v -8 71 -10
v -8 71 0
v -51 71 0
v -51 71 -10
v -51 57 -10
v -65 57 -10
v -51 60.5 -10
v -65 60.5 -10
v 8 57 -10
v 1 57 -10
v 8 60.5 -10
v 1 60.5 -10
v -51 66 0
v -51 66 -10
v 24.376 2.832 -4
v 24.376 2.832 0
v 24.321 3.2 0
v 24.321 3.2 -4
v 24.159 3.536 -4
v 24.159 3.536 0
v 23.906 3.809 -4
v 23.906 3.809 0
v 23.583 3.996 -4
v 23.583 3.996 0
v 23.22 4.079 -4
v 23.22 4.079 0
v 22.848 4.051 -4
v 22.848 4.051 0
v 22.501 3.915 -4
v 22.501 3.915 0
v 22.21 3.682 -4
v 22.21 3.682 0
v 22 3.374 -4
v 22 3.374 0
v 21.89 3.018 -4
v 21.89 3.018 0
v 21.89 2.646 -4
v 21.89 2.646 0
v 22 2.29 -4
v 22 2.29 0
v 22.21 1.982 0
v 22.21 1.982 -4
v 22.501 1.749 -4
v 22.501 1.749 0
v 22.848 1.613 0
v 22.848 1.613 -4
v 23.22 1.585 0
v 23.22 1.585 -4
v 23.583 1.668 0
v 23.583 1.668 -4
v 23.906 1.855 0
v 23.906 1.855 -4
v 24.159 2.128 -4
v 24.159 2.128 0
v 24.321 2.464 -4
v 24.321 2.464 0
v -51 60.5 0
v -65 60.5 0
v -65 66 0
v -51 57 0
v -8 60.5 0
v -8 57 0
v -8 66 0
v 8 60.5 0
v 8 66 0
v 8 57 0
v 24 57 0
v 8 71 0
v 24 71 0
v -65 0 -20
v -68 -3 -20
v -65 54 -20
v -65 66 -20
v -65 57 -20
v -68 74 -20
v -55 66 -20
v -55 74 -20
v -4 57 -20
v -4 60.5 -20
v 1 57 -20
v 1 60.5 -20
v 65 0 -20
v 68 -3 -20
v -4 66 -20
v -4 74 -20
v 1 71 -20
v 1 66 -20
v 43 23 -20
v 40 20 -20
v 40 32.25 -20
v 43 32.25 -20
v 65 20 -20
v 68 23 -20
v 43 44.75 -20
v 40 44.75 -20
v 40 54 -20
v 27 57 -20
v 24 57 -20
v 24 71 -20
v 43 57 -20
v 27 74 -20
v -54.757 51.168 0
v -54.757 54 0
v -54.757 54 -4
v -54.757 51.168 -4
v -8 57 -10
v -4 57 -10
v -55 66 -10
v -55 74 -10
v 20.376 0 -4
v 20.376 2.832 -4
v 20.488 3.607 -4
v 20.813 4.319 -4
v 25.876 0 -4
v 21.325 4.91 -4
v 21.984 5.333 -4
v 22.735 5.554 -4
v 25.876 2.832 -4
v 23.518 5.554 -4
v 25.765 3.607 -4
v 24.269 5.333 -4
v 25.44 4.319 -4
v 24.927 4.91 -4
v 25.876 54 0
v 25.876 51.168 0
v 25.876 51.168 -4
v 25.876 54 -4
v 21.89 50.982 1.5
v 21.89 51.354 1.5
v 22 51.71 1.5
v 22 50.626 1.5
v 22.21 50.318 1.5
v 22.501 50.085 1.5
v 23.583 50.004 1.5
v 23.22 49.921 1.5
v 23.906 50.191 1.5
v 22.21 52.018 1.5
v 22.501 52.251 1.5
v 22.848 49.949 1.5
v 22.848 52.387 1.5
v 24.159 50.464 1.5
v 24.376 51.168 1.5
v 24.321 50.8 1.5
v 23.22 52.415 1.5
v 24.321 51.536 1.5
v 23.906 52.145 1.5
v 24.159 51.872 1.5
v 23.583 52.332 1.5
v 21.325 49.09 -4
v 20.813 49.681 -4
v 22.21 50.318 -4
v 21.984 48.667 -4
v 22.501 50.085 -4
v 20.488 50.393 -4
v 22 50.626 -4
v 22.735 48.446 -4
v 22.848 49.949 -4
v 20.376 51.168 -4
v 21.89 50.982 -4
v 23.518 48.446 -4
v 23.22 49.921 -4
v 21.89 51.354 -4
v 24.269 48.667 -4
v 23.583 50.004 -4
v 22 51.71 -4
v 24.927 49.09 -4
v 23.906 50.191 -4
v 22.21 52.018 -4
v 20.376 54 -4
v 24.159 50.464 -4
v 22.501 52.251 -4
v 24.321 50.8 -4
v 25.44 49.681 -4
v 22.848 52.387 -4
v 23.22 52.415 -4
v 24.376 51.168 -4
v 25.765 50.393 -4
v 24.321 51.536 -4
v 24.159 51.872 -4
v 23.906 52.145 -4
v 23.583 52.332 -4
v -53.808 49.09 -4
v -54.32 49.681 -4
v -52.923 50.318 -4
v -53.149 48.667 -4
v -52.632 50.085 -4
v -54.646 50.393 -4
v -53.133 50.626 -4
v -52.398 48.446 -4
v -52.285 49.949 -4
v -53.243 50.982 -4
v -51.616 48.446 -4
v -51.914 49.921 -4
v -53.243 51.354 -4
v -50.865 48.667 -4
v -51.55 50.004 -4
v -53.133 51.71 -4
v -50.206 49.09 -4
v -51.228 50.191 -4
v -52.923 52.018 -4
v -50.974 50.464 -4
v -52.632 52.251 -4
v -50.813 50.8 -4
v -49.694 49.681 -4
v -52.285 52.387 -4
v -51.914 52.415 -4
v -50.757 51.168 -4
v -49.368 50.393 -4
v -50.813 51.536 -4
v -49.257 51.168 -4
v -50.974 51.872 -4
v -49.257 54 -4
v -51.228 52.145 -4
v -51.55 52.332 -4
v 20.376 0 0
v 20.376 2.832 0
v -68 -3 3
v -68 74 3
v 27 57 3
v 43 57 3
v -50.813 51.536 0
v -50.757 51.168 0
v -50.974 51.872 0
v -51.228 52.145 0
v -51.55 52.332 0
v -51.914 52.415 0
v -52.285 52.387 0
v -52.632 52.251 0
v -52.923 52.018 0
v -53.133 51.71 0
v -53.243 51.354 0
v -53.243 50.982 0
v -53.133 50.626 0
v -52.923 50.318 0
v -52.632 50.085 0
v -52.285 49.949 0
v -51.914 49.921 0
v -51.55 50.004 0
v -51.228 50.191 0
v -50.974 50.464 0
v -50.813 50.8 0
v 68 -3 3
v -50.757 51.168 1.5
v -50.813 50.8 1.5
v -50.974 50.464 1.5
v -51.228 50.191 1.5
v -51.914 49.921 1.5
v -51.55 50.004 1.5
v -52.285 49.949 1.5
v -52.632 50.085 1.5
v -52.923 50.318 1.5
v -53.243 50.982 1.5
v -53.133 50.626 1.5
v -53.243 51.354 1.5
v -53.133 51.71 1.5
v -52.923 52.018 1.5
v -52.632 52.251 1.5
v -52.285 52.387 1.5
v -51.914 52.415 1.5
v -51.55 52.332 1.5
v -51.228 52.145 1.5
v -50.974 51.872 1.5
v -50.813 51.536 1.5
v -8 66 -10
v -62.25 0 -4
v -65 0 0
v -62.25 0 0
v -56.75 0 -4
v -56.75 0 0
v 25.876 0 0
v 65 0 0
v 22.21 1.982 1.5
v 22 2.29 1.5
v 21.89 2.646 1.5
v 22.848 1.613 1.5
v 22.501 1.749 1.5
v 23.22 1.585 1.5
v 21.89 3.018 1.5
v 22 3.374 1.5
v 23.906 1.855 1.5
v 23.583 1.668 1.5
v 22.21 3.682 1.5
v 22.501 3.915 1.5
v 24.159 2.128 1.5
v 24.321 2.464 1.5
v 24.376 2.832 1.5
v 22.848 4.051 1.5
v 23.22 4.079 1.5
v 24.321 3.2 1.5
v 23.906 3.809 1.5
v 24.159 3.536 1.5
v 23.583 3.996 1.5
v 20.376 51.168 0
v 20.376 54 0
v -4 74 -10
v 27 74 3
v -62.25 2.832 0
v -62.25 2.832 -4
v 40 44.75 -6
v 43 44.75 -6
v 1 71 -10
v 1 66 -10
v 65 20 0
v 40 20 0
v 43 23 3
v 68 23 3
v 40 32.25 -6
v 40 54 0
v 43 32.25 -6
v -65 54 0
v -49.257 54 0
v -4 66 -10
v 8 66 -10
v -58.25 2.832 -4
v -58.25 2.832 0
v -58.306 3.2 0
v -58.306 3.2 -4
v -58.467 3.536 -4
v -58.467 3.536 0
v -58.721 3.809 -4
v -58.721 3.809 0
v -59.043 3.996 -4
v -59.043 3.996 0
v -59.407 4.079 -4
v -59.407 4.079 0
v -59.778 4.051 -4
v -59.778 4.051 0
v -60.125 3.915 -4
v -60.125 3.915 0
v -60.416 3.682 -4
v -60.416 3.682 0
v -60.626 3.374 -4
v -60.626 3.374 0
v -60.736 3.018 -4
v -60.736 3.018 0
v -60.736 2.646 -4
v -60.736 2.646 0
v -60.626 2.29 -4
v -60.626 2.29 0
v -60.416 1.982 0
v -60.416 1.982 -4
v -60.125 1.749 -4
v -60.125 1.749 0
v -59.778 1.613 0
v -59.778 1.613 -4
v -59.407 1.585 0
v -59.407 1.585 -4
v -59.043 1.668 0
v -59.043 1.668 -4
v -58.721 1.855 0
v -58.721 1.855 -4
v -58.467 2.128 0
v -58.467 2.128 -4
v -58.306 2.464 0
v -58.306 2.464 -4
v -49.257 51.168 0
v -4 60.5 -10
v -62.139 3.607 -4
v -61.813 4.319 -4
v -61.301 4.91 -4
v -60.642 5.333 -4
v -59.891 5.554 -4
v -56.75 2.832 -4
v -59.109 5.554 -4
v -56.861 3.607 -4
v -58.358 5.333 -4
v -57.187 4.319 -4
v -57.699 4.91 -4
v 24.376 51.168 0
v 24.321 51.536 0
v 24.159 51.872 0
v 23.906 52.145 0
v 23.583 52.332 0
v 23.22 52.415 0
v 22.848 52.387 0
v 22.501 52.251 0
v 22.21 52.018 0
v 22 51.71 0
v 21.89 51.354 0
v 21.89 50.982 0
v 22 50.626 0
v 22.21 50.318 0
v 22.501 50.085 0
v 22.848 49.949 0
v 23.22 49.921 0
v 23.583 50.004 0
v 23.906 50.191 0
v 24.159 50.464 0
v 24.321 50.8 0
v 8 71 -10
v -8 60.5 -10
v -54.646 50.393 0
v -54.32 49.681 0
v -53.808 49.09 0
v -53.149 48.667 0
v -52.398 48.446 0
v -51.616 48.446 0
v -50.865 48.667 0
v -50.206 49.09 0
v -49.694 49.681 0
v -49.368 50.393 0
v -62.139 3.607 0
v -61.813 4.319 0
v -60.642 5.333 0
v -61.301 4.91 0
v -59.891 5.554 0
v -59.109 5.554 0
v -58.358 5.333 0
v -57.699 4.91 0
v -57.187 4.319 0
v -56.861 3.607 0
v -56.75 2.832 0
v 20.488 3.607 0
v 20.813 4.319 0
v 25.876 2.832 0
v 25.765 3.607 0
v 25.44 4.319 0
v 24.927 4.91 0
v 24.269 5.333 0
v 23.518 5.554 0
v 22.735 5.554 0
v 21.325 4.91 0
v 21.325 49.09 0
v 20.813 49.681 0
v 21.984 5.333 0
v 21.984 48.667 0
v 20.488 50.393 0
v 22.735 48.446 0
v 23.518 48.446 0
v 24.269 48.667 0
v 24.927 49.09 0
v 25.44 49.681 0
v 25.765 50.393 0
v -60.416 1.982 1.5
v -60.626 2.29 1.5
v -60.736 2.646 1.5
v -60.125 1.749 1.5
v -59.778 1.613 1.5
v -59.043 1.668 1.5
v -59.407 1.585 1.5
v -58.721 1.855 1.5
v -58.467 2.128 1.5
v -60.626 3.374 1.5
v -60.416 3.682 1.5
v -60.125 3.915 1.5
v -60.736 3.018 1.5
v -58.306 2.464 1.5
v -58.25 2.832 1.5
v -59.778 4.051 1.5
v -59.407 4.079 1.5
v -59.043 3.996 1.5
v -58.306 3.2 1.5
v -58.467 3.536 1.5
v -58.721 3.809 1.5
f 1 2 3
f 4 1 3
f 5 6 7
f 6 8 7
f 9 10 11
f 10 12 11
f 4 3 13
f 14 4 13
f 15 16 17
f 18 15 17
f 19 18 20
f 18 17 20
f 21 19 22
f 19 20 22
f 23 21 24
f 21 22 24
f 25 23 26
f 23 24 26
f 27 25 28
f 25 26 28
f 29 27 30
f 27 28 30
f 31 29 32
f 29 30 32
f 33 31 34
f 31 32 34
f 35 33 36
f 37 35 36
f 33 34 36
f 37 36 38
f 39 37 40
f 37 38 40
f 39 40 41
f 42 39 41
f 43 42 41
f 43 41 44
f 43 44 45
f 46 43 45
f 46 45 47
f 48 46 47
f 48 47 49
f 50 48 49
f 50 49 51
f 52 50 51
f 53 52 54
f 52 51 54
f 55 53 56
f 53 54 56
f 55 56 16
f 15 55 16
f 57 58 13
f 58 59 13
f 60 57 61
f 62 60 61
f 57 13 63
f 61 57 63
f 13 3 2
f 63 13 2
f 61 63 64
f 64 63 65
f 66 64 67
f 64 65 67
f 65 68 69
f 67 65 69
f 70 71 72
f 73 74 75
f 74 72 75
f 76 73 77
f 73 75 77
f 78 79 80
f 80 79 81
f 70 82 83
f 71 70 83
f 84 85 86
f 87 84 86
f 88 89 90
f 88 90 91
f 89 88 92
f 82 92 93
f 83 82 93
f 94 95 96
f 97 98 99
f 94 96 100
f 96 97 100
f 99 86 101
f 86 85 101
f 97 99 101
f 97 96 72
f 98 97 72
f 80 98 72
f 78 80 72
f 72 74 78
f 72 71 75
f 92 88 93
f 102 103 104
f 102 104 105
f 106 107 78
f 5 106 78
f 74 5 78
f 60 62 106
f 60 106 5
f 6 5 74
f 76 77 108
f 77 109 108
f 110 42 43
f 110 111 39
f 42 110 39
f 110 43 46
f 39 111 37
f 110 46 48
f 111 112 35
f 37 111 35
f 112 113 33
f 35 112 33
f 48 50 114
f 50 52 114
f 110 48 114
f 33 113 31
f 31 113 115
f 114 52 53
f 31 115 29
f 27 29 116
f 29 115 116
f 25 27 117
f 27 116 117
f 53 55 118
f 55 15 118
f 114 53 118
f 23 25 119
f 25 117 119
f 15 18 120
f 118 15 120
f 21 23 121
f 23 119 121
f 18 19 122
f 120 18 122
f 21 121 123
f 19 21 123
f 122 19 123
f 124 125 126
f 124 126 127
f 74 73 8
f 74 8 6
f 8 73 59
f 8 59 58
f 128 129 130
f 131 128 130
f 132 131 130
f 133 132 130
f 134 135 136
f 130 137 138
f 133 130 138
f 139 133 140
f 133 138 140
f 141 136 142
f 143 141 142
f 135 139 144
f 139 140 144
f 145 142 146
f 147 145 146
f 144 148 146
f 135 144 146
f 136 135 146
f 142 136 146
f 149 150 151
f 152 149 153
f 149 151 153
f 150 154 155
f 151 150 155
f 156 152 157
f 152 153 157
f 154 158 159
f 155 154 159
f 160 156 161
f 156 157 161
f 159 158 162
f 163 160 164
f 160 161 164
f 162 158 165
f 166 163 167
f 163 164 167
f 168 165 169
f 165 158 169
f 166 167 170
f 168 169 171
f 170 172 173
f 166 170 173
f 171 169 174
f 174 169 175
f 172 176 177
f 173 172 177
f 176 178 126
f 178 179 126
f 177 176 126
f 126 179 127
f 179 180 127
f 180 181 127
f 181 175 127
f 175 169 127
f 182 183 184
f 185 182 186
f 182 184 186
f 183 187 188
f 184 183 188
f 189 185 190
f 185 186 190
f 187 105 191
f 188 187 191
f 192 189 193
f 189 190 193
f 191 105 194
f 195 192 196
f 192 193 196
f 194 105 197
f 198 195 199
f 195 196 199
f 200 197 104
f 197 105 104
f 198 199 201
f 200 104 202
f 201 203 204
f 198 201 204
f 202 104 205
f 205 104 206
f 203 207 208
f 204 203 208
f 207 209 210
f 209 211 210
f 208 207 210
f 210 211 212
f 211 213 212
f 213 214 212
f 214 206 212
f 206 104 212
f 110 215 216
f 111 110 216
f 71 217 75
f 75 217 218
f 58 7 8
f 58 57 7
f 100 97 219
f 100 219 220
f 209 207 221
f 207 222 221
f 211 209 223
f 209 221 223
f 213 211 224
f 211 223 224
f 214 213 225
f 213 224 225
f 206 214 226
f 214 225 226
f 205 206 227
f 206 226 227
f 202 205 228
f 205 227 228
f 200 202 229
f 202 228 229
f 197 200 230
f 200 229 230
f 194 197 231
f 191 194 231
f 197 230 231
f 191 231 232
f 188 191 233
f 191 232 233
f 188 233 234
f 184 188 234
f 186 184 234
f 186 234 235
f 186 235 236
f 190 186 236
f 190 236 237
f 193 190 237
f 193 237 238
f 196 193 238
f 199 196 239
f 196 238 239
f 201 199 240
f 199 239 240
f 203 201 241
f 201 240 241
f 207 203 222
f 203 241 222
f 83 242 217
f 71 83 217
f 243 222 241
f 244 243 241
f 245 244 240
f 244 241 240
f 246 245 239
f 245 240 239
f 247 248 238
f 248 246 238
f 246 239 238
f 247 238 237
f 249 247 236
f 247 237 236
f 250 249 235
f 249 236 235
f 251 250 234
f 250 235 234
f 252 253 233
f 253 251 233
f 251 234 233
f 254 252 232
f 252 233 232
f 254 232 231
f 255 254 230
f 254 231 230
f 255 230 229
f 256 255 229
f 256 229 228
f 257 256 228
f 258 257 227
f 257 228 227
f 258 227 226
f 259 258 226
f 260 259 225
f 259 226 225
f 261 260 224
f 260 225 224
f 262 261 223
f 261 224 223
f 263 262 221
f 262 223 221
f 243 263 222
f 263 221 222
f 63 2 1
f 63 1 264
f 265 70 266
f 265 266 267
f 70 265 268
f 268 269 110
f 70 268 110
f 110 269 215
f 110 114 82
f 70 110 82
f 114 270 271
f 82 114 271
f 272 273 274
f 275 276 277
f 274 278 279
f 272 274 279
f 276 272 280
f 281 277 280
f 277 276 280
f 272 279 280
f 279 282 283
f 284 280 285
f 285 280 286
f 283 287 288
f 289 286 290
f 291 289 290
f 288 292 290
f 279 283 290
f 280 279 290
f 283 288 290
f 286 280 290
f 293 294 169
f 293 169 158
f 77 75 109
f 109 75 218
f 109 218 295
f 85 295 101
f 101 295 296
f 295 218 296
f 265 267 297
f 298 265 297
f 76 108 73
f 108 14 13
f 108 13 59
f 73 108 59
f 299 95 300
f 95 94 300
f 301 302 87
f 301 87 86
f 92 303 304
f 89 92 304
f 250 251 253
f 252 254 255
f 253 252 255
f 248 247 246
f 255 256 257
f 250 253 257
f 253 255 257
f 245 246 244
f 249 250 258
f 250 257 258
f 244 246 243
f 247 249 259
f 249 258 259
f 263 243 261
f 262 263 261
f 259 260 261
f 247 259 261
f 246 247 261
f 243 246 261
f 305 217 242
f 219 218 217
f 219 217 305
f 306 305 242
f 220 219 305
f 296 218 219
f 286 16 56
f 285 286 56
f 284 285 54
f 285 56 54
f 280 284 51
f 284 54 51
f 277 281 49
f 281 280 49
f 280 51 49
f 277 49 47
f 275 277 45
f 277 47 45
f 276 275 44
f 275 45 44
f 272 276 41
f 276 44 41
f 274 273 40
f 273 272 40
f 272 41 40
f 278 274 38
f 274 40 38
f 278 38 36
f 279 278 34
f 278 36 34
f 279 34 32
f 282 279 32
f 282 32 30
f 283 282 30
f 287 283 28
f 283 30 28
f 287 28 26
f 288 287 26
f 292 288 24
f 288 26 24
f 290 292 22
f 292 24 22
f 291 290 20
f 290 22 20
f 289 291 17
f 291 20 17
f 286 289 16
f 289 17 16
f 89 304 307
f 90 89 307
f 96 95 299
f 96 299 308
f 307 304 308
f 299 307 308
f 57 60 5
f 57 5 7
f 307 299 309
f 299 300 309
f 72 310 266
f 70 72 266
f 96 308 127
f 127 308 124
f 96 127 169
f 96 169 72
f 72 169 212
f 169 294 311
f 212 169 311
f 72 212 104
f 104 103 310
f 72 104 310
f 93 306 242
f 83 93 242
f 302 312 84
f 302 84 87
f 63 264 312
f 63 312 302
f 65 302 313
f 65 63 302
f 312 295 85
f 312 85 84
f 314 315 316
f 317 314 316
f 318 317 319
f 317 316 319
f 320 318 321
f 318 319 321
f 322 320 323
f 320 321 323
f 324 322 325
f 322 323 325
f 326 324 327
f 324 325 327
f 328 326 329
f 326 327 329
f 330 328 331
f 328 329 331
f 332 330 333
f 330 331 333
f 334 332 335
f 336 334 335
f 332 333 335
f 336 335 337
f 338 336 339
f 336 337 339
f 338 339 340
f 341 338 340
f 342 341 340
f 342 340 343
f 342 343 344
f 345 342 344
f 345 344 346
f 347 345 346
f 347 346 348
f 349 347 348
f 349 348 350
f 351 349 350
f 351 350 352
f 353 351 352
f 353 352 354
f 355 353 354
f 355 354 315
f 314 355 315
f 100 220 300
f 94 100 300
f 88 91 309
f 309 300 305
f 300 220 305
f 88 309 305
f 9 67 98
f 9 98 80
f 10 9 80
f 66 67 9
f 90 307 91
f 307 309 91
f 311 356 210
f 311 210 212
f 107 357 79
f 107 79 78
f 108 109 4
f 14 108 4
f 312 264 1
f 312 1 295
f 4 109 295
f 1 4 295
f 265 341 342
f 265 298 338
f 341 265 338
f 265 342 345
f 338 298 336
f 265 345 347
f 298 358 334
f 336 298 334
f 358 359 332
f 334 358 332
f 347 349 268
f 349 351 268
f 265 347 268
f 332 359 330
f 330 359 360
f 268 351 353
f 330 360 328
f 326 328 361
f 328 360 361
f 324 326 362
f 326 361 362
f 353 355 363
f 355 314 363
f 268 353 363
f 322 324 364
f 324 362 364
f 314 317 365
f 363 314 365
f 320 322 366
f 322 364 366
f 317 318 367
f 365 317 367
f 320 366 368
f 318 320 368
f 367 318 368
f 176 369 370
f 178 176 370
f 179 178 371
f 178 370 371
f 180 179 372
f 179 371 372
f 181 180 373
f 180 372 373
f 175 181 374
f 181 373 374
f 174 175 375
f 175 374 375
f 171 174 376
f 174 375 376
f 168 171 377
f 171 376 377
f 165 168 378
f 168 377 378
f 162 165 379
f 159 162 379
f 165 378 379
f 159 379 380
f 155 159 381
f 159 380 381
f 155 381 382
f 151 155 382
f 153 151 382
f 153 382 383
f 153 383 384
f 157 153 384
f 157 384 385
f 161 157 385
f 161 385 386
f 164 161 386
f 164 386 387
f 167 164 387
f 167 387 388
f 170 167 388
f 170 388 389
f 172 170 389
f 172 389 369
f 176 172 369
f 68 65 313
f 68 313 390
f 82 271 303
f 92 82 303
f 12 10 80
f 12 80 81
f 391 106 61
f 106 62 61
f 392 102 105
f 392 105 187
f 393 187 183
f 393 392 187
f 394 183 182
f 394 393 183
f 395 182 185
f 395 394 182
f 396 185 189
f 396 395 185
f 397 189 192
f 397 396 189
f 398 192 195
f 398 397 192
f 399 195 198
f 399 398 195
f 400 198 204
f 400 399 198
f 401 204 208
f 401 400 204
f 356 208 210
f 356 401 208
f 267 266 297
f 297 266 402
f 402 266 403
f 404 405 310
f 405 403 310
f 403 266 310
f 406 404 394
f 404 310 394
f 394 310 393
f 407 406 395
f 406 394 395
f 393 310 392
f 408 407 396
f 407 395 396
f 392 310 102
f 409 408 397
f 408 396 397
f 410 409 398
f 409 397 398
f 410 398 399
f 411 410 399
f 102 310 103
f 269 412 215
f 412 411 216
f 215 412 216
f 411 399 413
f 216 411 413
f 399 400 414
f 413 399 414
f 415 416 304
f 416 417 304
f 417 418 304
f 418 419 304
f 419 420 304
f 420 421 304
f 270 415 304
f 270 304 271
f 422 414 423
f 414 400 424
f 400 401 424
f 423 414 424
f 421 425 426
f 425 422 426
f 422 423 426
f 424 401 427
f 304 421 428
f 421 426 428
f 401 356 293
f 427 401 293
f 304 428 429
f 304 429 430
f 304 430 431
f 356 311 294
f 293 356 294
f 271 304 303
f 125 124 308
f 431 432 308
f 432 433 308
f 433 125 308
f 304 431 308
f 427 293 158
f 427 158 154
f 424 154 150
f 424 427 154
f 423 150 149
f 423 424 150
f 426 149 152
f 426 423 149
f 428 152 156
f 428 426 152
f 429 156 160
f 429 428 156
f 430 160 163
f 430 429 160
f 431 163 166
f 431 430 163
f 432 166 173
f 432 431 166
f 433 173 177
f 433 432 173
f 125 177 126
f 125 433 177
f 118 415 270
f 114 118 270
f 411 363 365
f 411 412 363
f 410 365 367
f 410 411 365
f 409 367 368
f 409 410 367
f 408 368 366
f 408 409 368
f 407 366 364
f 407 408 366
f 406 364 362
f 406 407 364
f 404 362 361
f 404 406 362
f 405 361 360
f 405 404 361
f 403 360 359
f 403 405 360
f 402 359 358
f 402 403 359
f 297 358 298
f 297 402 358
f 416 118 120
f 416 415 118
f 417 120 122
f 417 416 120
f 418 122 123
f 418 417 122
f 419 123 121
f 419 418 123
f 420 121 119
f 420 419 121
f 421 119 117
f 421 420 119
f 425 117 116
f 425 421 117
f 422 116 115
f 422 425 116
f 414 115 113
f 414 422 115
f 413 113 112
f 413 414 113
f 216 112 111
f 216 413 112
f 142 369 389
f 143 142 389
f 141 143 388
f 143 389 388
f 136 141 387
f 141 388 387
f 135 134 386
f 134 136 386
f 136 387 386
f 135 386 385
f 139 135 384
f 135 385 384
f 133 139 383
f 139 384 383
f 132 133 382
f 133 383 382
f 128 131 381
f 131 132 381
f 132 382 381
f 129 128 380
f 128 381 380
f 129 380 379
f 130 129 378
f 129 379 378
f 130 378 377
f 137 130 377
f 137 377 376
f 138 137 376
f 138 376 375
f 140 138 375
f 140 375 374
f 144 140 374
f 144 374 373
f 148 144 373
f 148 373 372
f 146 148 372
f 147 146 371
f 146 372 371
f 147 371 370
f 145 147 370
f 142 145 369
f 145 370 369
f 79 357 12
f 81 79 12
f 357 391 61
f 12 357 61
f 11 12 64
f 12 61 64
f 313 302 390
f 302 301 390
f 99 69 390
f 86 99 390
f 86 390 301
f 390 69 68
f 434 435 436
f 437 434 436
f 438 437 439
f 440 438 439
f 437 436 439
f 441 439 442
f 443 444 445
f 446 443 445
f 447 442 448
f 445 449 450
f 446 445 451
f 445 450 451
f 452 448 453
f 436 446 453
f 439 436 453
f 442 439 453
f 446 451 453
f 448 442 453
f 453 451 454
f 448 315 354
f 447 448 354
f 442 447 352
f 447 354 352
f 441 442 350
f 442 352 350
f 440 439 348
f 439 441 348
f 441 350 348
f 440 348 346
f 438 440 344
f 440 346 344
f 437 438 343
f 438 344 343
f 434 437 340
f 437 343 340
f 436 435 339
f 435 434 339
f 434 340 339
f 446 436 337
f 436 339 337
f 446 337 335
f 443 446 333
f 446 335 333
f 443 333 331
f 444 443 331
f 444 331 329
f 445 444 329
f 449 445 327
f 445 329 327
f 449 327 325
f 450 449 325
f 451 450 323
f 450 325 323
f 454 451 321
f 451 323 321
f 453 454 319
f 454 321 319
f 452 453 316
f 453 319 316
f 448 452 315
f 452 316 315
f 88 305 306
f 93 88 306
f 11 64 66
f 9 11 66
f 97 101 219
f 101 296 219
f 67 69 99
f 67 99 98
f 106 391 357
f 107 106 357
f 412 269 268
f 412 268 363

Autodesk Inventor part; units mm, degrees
ref_plane "YZ Plane" through (0, 0, 0) normal (1, 0, 0) x (0, 1, 0)
ref_plane "XZ Plane" through (0, 0, 0) normal (0, 1, 0) x (-1, 0, 0)
ref_plane "XY Plane" through (0, 0, 0) normal (0, 0, 1) x (1, 0, 0)
sketch "Skizze1" plane through (0, 0, 0) normal (0, 0, 1) x (1, 0, 0)
  line L0 (-65, 0) -> (65, 0)
  line L1 (65, 0) -> (65, 20)
  line L2 (65, 20) -> (40, 20)
  line L3 (40, 20) -> (40, 54)
  line L4 (-65, 41) -> (-65, 0)
  line L5 (-65, 41) -> (-65, 41)
  line L6 (-65, 54) -> (-65, 54)
  line L7 (-65, 54) -> (-65, 41)
  line L8 (24, 71) -> (24, 54)
  line L9 (24, 54) -> (40, 54)
  circle A0 centre (-59.5, 2.832) radius 1.25
  circle A1 centre (23.1262, 2.832) radius 1.25
  circle A2 centre (23.1262, 51.168) radius 1.25
  circle A3 centre (-52.007, 51.168) radius 1.25
  line L10 (25.8762, 2.832) -> (25.8762, 0)
  line L11 (25.8762, 0) -> (20.3762, 0)
  line L12 (20.3762, 0) -> (20.3762, 2.832)
  arc A4 (25.8762, 2.832) -> (20.3762, 2.832) centre (23.1262, 2.832) ccw
  line L13 (-56.75, 0) -> (-56.75, 2.832)
  line L14 (-62.25, 0) -> (-62.25, 2.832)
  line L15 (-56.75, 0) -> (-62.25, 0)
  arc A5 (-56.75, 2.832) -> (-62.25, 2.832) centre (-59.5, 2.832) ccw
  line L16 (25.8762, 51.168) -> (25.8762, 54)
  line L17 (25.8762, 54) -> (20.3762, 54)
  line L18 (20.3762, 54) -> (20.3762, 51.168)
  arc A6 (20.3762, 51.168) -> (25.8762, 51.168) centre (23.1262, 51.168) ccw
  line L19 (-49.257, 51.168) -> (-49.257, 54)
  line L20 (-49.257, 54) -> (-54.757, 54)
  line L21 (-54.757, 54) -> (-54.757, 51.168)
  arc A7 (-54.757, 51.168) -> (-49.257, 51.168) centre (-52.007, 51.168) ccw
  line L22 (-65, 54) -> (24, 54)
  line L23 (24, 54) -> (24, 57)
  line L24 (24, 57) -> (-65, 57)
  line L25 (-65, 57) -> (-65, 54)
  line L26 (24, 71) -> (-65, 71)
  line L27 (-65, 71) -> (-65, 54)
  line L28 (43, 23) -> (68, 23)
  line L29 (68, 23) -> (68, -3)
  line L30 (68, -3) -> (-68, -3)
  line L31 (-68, -3) -> (-68, 44)
  line L32 (-68, 44) -> (-68, 44)
  line L33 (-68, 44) -> (-68, 57)
  line L34 (-68, 57) -> (-68, 57)
  line L35 (-68, 57) -> (-68, 74)
  line L36 (-68, 74) -> (27, 74)
  line L37 (27, 74) -> (27, 57)
  line L38 (27, 57) -> (43, 57)
  line L39 (43, 57) -> (43, 23)
  line L40 (-65, 71) -> (-51, 71)
  line L41 (-51, 71) -> (-51, 66)
  line L42 (-51, 66) -> (-65, 66)
  line L43 (-65, 66) -> (-65, 71)
  line L44 (8, 71) -> (-8, 71)
  line L45 (-8, 71) -> (-8, 66)
  line L46 (-8, 66) -> (8, 66)
  line L47 (8, 66) -> (8, 71)
  line L48 (-65, 71) -> (-55, 71)
  line L49 (-55, 71) -> (-55, 66)
  line L50 (-55, 66) -> (-65, 66)
  line L51 (-65, 66) -> (-65, 71)
  line L52 (1, 71) -> (-4, 71)
  line L53 (-4, 71) -> (-4, 66)
  line L54 (-4, 66) -> (1, 66)
  line L55 (1, 66) -> (1, 71)
  line L56 (8, 71) -> (1, 71)
  line L57 (1, 71) -> (1, 66)
  line L58 (1, 66) -> (8, 66)
  line L59 (8, 66) -> (8, 71)
  line L60 (-4, 71) -> (-8, 71)
  line L61 (-8, 71) -> (-8, 66)
  line L62 (-8, 66) -> (-4, 66)
  line L63 (-4, 66) -> (-4, 71)
  line L64 (8, 57) -> (-8, 57)
  line L65 (-8, 57) -> (-8, 60.5)
  line L66 (-8, 60.5) -> (8, 60.5)
  line L67 (8, 60.5) -> (8, 57)
  line L68 (1, 60.5) -> (-4, 60.5)
  line L69 (-4, 60.5) -> (-4, 57)
  line L70 (-4, 57) -> (1, 57)
  line L71 (1, 57) -> (1, 60.5)
  line L72 (-65, 57) -> (-51, 57)
  line L73 (-51, 57) -> (-51, 60.5)
  line L74 (-51, 60.5) -> (-65, 60.5)
  line L75 (-65, 60.5) -> (-65, 57)
  line L76 (-55, 60.5) -> (-65, 60.5)
  line L77 (-65, 60.5) -> (-65, 57)
  line L78 (-65, 57) -> (-55, 57)
  line L79 (-55, 57) -> (-55, 60.5)
  point P0 (0, 0)
  point P1 (0, 0)
  point P2 (0, 0)
  dimension "d0" = 130
  dimension "d1" = 25
  dimension "d8" = 20
  dimension "d9" = 41
  dimension "d11" = 54
  dimension "d42" = 5.5
  dimension "d43" = 82.6262
  dimension "d44" = 2.5
  dimension "d45" = 2.832
  dimension "d46" = 7.493
  dimension "d47" = 48.336
  dimension "d48" = 5.5
  dimension "d49" = 5.5
  dimension "d50" = 5.5
  dimension "d51" = 5.5
  dimension "d52" = 3
  dimension "d57" = 0
  dimension "d58" = 89
  dimension "d59" = 71
  dimension "d60" = 3
  dimension "d61" = 2.832
  dimension "d70" = 16
  dimension "d71" = 14
  dimension "d72" = 5
  dimension "d73" = 43
  dimension "d76" = 10
  dimension "d79" = 51
  dimension "d80" = 5
  dimension "d83" = 5.5
  dimension "d84" = 0
extrude "Extrusion1" add sketch "Skizze1" along normal blind 3 contours L4 L7 L22 L21 A7 L19 L18 A6 L16 L9 L3 L2 L1 L0 L10 A4 L12 L13 A5 L14 | L14 A5 L13 L0 | L25 L24 L8 L17 L22 L20 | L12 A4 L10 L0 | L20 L19 A7 L21 | L27 L74 L79 L24 | L79 L74 L73 L24 | L27 L42 L41 L26 L45 L46 L47 L8 L24 L67 L66 L65 L73 L74 | L17 L9 L16 A6 L18 | L27 L26 L49 L42 | L65 L66 L69 L24 | L49 L26 L41 L42 | L69 L66 L71 L24 | L24 L71 L66 L67 | L47 L46 L55 L26 | L26 L53 L46 L45 | L55 L46 L53 L26 | A0 | A1 | A2 | A3 | L28 L29 L30 L31 L33 L35 L36 L37 L38 L39
extrude "Extrusion2" add sketch "Skizze1" against normal blind 20 contours L25 L24 L8 L17 L22 L20 | L27 L26 L49 L42 | L69 L66 L71 L24 | L55 L46 L53 L26 | L28 L29 L30 L31 L33 L35 L36 L37 L38 L39
sketch "Skizze2" plane through (43, 23, 3) normal (1, 0, 0) x (0, 0, -1)
  line L0 (23, 21.75) -> (9, 21.75)
  line L1 (9, 21.75) -> (9, 9.25)
  line L2 (9, 9.25) -> (23, 9.25)
  line L3 (23, 9.25) -> (23, 21.75)
  line L4 (23, 0) -> (0, 0) projected
  line L5 (23, 34) -> (23, 0) projected
  point P0 (3, -23)
  dimension "d62" = 9.25
  dimension "d63" = 21.75
  dimension "d64" = 14
extrude "Extrusion3" cut sketch "Skizze2" against normal up to surface (3 mm away)
extrude "Extrusion6" add sketch "Skizze1" against normal blind 10 contours L27 L74 L79 L24 | L79 L74 L73 L24 | L27 L26 L49 L42 | L65 L66 L69 L24 | L49 L26 L41 L42 | L69 L66 L71 L24 | L24 L71 L66 L67 | L47 L46 L55 L26 | L26 L53 L46 L45 | L55 L46 L53 L26
extrude "Extrusion4" add sketch "Skizze1" against normal blind 4 contours L14 A5 L13 L0 | L12 A4 L10 L0 | L20 L19 A7 L21 | L17 L9 L16 A6 L18
extrude "Extrusion7" cut sketch "Skizze1" along normal blind 1.5 contours A0 | A1 | A2 | A3
sketch "Skizze3" plane through (-68, 74, 3) normal (0, 1, 0) x (1, 0, 0)
  line L0 (0, 0) -> (0, 23) projected
  line L1 (95, 0) -> (0, 0) projected
  line L2 (0, 23) -> (95, 23) projected
  line L3 (13, 13) -> (64, 13)
  line L4 (64, 13) -> (64, 23)
  line L5 (64, 23) -> (13, 23)
  line L6 (13, 23) -> (13, 13)
  point P0 (68, 3)
  dimension "d65" = 13
  dimension "d66" = 13
  dimension "d67" = 51
extrude "Extrusion5" cut sketch "Skizze3" against normal up to surface (3 mm away)
properties part number "Basis"
